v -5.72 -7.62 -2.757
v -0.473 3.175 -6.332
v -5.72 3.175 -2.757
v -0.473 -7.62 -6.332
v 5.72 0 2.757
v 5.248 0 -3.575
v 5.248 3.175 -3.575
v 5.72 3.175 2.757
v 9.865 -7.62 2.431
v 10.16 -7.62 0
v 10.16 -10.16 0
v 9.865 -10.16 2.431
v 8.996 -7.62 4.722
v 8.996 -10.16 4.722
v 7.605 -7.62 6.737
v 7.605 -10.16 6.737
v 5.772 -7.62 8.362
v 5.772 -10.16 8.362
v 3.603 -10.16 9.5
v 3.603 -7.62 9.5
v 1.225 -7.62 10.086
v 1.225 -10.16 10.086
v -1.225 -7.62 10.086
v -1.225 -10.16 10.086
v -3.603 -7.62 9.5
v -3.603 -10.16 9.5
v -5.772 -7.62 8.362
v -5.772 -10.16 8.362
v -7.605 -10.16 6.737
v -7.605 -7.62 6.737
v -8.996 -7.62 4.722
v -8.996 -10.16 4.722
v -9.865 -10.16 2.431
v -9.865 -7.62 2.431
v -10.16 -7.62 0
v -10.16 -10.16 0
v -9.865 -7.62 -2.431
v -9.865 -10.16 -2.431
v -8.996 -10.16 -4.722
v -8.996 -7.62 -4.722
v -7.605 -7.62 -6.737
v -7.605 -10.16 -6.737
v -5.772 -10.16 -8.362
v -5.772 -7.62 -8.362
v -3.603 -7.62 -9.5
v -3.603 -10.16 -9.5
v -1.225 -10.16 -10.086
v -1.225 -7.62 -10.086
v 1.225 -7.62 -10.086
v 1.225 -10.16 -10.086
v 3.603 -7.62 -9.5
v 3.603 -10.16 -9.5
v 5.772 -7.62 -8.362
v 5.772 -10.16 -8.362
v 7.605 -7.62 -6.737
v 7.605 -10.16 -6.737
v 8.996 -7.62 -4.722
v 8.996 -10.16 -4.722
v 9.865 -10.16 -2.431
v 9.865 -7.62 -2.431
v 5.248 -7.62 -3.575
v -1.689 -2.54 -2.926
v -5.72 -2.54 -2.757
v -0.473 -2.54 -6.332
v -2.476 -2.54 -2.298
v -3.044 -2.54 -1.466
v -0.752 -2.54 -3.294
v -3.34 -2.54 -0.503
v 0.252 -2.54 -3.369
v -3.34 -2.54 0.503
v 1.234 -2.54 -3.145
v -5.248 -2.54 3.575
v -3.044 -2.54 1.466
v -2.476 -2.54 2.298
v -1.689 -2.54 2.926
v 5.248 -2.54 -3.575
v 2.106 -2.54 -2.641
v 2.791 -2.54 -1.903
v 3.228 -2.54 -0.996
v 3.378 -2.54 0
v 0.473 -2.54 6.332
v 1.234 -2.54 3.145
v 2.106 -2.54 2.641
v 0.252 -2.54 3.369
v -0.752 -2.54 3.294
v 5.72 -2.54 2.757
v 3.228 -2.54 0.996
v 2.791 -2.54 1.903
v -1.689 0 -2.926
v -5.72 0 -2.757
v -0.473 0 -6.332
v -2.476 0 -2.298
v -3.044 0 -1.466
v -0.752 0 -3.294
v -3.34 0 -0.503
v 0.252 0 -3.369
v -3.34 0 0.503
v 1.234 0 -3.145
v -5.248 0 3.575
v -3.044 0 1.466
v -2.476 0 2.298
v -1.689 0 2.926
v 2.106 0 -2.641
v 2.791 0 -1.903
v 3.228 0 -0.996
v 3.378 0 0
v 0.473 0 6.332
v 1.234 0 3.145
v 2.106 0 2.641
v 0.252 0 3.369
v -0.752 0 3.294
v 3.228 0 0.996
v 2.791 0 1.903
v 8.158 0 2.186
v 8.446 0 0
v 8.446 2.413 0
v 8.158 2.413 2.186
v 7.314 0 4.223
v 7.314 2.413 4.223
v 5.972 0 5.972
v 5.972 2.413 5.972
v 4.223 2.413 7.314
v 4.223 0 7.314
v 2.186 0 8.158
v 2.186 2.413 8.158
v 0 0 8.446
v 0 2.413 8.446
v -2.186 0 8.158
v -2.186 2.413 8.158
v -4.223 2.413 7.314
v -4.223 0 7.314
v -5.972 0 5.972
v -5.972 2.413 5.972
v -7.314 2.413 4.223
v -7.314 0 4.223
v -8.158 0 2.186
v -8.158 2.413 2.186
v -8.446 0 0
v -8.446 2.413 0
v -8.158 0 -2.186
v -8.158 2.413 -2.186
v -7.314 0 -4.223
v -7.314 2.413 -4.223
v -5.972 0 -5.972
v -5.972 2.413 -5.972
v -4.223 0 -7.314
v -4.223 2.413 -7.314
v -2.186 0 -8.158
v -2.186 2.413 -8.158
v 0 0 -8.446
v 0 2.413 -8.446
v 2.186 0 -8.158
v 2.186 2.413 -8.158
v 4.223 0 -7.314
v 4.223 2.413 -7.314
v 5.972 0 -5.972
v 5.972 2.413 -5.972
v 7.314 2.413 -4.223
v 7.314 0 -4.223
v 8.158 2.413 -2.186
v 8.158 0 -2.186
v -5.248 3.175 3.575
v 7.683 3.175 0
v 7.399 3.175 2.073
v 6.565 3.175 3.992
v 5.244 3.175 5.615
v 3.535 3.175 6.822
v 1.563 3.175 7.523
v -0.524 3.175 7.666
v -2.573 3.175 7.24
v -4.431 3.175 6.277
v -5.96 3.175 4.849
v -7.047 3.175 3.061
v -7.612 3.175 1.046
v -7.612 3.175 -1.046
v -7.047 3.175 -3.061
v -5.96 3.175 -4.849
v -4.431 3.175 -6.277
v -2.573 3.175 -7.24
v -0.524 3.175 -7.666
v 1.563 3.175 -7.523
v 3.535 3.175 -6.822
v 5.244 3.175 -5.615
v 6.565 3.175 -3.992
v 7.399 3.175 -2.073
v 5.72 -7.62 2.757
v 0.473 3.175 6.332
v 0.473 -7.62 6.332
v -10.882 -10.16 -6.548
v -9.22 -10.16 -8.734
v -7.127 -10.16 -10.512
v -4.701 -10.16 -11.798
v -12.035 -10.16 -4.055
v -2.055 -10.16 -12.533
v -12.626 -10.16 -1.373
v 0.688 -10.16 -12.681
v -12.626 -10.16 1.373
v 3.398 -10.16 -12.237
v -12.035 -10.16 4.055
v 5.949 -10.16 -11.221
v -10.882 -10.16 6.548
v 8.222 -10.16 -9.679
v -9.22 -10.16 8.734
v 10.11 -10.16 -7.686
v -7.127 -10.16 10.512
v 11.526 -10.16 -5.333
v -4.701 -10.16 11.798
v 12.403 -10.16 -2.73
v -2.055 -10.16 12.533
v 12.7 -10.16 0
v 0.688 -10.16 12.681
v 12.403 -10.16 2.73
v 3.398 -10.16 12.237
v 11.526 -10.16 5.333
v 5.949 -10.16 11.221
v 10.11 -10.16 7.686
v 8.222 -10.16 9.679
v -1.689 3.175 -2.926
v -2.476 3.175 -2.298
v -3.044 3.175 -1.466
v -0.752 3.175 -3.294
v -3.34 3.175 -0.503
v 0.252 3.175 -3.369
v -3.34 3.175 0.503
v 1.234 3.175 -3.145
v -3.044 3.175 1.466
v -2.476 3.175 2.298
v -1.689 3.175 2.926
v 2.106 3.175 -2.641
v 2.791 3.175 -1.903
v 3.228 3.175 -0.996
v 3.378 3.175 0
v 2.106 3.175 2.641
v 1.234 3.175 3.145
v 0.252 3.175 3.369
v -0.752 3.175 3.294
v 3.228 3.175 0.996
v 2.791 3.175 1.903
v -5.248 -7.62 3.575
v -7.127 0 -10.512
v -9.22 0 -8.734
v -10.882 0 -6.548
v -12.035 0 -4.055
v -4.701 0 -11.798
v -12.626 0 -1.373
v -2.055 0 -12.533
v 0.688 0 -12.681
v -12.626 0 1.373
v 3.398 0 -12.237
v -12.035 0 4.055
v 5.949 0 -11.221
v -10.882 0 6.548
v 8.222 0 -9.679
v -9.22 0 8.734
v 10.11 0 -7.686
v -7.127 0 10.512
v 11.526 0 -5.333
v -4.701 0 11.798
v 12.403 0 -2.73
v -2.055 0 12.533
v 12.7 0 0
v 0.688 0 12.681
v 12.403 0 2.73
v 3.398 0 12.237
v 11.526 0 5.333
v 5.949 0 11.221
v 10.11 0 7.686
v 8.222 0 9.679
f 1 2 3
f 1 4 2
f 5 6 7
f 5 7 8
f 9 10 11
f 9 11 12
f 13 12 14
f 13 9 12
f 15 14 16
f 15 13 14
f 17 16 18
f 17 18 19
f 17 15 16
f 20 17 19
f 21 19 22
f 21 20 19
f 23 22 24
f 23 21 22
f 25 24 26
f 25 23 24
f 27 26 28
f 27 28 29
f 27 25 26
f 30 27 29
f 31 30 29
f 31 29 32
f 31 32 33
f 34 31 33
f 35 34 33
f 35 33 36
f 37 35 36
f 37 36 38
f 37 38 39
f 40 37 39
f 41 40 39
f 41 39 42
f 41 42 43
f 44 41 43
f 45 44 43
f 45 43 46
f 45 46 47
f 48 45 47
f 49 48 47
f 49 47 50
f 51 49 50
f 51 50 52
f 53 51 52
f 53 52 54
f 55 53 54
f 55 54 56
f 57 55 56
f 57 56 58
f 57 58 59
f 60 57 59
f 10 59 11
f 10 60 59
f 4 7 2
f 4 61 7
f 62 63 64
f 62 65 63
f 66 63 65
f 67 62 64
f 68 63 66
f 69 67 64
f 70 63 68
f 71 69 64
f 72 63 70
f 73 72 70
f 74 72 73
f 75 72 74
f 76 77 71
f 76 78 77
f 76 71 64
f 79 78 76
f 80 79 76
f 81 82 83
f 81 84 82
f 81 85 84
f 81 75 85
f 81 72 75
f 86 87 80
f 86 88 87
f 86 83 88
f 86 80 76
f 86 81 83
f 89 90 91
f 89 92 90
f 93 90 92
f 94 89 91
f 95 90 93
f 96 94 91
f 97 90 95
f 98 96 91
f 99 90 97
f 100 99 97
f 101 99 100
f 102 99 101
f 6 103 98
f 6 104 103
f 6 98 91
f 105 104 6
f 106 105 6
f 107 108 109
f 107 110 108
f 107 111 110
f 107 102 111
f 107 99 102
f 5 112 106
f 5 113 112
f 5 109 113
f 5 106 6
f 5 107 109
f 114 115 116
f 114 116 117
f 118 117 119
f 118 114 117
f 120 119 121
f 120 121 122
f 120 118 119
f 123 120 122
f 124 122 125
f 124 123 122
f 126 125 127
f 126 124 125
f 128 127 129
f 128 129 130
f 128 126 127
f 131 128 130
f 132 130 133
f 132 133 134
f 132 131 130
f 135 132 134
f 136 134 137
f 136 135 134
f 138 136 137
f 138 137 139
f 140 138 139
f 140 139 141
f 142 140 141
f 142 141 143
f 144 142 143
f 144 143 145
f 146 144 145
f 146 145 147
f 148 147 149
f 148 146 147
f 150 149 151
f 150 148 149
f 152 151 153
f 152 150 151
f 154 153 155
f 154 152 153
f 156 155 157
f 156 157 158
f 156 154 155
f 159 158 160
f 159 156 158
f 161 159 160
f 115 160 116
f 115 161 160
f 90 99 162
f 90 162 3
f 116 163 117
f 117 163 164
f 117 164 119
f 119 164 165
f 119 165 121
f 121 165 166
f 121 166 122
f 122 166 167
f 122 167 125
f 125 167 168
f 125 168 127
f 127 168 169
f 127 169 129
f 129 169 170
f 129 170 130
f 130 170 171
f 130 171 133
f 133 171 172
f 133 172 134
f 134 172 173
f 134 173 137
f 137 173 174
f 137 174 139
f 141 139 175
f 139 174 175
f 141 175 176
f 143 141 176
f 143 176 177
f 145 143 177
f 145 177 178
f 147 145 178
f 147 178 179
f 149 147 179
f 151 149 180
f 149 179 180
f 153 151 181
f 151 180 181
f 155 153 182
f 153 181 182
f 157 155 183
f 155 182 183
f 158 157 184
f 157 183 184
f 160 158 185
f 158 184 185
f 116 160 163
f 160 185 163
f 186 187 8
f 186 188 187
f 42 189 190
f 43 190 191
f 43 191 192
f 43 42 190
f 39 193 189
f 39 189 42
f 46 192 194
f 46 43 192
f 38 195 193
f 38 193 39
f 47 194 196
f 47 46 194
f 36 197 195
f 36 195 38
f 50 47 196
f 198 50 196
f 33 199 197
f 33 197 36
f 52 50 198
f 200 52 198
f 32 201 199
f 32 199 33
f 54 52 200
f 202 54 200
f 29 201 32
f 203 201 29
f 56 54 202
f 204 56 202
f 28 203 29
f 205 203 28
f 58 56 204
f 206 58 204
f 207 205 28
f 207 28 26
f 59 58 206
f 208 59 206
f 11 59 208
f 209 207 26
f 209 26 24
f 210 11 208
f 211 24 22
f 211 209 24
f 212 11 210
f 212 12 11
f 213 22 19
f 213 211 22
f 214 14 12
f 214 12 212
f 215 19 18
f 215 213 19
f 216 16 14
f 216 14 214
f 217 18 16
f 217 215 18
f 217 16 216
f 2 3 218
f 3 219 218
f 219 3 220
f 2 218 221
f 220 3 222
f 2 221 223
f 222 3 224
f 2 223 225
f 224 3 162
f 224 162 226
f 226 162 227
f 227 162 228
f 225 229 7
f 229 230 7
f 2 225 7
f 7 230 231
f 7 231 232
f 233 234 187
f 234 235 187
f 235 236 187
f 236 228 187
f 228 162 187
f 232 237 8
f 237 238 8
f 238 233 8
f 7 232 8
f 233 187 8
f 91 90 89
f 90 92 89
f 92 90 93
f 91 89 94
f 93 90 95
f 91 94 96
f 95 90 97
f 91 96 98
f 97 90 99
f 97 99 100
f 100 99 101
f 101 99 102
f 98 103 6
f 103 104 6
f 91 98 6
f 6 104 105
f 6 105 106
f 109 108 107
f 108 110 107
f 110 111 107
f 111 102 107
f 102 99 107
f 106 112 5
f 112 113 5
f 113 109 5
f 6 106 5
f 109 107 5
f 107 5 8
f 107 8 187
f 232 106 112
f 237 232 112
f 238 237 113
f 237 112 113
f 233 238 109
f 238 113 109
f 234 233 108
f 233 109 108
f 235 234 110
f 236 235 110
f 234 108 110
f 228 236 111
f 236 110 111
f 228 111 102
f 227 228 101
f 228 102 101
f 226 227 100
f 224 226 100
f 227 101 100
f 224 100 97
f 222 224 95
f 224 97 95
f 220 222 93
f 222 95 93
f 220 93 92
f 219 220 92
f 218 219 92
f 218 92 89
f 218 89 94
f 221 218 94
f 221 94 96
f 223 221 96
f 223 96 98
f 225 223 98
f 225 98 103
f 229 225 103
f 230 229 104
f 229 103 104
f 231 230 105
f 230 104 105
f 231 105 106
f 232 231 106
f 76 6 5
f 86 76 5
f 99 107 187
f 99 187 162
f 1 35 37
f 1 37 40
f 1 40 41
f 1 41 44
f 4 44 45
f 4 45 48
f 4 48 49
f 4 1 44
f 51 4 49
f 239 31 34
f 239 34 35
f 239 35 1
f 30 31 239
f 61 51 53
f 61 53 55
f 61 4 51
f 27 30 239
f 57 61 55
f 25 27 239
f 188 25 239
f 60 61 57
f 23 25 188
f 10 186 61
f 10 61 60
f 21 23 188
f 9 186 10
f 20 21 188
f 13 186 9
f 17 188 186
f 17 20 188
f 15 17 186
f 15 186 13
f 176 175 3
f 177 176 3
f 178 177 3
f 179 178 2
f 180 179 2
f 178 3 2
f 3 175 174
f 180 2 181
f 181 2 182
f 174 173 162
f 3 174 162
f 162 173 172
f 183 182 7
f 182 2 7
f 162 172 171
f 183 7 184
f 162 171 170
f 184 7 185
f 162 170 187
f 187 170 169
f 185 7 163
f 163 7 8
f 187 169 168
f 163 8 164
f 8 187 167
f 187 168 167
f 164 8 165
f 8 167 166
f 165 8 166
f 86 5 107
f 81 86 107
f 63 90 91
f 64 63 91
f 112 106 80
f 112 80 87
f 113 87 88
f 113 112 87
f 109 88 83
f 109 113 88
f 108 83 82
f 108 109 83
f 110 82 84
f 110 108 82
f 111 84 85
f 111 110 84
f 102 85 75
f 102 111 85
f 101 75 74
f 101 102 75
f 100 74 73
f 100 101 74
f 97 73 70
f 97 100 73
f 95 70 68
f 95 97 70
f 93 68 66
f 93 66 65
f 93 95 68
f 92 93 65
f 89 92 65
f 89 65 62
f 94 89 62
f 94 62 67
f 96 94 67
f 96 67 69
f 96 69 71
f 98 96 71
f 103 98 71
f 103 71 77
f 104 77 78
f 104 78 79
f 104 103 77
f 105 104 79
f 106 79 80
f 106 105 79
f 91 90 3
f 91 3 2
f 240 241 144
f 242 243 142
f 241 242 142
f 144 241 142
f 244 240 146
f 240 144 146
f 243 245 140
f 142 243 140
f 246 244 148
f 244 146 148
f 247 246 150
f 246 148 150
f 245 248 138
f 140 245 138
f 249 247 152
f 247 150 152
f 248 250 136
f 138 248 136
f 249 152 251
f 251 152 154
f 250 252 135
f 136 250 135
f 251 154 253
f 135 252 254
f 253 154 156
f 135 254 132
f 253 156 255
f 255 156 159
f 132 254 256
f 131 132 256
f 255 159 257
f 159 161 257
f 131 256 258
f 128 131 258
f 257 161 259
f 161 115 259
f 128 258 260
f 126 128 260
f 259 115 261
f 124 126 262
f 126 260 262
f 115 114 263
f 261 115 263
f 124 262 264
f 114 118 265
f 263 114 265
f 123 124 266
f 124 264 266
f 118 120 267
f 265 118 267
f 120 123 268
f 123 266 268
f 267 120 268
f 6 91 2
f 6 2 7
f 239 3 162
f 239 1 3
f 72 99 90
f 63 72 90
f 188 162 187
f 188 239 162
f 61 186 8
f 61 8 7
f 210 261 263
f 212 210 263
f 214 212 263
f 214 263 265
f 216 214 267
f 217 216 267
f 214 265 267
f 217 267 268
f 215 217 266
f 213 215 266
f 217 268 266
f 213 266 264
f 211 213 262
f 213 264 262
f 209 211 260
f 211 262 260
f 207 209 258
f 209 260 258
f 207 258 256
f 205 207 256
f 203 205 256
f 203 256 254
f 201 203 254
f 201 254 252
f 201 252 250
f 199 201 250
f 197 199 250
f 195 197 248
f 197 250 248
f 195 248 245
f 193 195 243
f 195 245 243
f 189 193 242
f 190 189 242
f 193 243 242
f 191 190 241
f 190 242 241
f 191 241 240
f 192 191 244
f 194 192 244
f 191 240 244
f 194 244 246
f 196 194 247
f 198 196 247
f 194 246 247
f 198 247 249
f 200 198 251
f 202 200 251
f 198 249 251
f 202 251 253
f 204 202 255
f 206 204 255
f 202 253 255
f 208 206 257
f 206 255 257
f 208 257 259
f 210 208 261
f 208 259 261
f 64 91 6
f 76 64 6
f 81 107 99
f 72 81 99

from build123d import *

# Parameters (mm, degrees)
F0_R     = 12.7
F0_R_2   = 10.16
F1_DEPTH = 10.16
F0_R_3   = 8.4455
F2_DEPTH = 7.62
F3_DEPTH = 7.62
F4_DEPTH = 3.175
F0_R_4   = 3.3782
F5_DEPTH = 3.175
F6_DEPTH = 2.54
F7_SIZE  = 0.762


with BuildPart() as f1:
    # F0 (on Front) → F1 (new body)
    with BuildSketch(Plane.XZ):
        Circle(F0_R)
        Circle(F0_R_2, mode=Mode.SUBTRACT)
    extrude(amount=F1_DEPTH)

    # F0 (on Front) → F2 (join)
    with BuildSketch(Plane.XZ):
        Circle(F0_R_2)
        Circle(F0_R_3, mode=Mode.SUBTRACT)
    extrude(amount=F2_DEPTH)

    # F0 (on Front) → F3 (join)
    with BuildSketch(Plane.XZ):
        Circle(F0_R_3)
        Polygon((5.720142, 2.756829), (5.247555, -3.575374), (-0.472587, -6.332203), (-5.720142, -2.756829), (-5.247555, 3.575374), (0.472587, 6.332203), align=None, mode=Mode.SUBTRACT)
    extrude(amount=F3_DEPTH)

    # F0 (on Front) → F4 (join)
    with BuildSketch(Plane.XZ):
        Circle(F0_R_3)
        Polygon((5.720142, 2.756829), (5.247555, -3.575374), (-0.472587, -6.332203), (-5.720142, -2.756829), (-5.247555, 3.575374), (0.472587, 6.332203), align=None, mode=Mode.SUBTRACT)
    extrude(amount=-F4_DEPTH)

    # F7
    f7_edges = [f1.edges().sort_by_distance(p)[0] for p in [
        (-8.4455, 3.175, 0),
    ]]
    chamfer(f7_edges, length=F7_SIZE)


with BuildPart() as f5:
    # F0 (on Front) → F5 (new body)
    with BuildSketch(Plane.XZ):
        Polygon((-0.472587, -6.332203), (5.247555, -3.575374), (5.720142, 2.756829), (0.472587, 6.332203), (-5.247555, 3.575374), (-5.720142, -2.756829), align=None)
        Circle(F0_R_4, mode=Mode.SUBTRACT)
    extrude(amount=-F5_DEPTH)


with BuildPart() as f6:
    # F0 (on Front) → F6 (new body)
    with BuildSketch(Plane.XZ):
        Polygon((-0.472587, -6.332203), (5.247555, -3.575374), (5.720142, 2.756829), (0.472587, 6.332203), (-5.247555, 3.575374), (-5.720142, -2.756829), align=None)
        Circle(F0_R_4, mode=Mode.SUBTRACT)
    extrude(amount=F6_DEPTH)


solid = Compound([f1.part, f5.part, f6.part])
